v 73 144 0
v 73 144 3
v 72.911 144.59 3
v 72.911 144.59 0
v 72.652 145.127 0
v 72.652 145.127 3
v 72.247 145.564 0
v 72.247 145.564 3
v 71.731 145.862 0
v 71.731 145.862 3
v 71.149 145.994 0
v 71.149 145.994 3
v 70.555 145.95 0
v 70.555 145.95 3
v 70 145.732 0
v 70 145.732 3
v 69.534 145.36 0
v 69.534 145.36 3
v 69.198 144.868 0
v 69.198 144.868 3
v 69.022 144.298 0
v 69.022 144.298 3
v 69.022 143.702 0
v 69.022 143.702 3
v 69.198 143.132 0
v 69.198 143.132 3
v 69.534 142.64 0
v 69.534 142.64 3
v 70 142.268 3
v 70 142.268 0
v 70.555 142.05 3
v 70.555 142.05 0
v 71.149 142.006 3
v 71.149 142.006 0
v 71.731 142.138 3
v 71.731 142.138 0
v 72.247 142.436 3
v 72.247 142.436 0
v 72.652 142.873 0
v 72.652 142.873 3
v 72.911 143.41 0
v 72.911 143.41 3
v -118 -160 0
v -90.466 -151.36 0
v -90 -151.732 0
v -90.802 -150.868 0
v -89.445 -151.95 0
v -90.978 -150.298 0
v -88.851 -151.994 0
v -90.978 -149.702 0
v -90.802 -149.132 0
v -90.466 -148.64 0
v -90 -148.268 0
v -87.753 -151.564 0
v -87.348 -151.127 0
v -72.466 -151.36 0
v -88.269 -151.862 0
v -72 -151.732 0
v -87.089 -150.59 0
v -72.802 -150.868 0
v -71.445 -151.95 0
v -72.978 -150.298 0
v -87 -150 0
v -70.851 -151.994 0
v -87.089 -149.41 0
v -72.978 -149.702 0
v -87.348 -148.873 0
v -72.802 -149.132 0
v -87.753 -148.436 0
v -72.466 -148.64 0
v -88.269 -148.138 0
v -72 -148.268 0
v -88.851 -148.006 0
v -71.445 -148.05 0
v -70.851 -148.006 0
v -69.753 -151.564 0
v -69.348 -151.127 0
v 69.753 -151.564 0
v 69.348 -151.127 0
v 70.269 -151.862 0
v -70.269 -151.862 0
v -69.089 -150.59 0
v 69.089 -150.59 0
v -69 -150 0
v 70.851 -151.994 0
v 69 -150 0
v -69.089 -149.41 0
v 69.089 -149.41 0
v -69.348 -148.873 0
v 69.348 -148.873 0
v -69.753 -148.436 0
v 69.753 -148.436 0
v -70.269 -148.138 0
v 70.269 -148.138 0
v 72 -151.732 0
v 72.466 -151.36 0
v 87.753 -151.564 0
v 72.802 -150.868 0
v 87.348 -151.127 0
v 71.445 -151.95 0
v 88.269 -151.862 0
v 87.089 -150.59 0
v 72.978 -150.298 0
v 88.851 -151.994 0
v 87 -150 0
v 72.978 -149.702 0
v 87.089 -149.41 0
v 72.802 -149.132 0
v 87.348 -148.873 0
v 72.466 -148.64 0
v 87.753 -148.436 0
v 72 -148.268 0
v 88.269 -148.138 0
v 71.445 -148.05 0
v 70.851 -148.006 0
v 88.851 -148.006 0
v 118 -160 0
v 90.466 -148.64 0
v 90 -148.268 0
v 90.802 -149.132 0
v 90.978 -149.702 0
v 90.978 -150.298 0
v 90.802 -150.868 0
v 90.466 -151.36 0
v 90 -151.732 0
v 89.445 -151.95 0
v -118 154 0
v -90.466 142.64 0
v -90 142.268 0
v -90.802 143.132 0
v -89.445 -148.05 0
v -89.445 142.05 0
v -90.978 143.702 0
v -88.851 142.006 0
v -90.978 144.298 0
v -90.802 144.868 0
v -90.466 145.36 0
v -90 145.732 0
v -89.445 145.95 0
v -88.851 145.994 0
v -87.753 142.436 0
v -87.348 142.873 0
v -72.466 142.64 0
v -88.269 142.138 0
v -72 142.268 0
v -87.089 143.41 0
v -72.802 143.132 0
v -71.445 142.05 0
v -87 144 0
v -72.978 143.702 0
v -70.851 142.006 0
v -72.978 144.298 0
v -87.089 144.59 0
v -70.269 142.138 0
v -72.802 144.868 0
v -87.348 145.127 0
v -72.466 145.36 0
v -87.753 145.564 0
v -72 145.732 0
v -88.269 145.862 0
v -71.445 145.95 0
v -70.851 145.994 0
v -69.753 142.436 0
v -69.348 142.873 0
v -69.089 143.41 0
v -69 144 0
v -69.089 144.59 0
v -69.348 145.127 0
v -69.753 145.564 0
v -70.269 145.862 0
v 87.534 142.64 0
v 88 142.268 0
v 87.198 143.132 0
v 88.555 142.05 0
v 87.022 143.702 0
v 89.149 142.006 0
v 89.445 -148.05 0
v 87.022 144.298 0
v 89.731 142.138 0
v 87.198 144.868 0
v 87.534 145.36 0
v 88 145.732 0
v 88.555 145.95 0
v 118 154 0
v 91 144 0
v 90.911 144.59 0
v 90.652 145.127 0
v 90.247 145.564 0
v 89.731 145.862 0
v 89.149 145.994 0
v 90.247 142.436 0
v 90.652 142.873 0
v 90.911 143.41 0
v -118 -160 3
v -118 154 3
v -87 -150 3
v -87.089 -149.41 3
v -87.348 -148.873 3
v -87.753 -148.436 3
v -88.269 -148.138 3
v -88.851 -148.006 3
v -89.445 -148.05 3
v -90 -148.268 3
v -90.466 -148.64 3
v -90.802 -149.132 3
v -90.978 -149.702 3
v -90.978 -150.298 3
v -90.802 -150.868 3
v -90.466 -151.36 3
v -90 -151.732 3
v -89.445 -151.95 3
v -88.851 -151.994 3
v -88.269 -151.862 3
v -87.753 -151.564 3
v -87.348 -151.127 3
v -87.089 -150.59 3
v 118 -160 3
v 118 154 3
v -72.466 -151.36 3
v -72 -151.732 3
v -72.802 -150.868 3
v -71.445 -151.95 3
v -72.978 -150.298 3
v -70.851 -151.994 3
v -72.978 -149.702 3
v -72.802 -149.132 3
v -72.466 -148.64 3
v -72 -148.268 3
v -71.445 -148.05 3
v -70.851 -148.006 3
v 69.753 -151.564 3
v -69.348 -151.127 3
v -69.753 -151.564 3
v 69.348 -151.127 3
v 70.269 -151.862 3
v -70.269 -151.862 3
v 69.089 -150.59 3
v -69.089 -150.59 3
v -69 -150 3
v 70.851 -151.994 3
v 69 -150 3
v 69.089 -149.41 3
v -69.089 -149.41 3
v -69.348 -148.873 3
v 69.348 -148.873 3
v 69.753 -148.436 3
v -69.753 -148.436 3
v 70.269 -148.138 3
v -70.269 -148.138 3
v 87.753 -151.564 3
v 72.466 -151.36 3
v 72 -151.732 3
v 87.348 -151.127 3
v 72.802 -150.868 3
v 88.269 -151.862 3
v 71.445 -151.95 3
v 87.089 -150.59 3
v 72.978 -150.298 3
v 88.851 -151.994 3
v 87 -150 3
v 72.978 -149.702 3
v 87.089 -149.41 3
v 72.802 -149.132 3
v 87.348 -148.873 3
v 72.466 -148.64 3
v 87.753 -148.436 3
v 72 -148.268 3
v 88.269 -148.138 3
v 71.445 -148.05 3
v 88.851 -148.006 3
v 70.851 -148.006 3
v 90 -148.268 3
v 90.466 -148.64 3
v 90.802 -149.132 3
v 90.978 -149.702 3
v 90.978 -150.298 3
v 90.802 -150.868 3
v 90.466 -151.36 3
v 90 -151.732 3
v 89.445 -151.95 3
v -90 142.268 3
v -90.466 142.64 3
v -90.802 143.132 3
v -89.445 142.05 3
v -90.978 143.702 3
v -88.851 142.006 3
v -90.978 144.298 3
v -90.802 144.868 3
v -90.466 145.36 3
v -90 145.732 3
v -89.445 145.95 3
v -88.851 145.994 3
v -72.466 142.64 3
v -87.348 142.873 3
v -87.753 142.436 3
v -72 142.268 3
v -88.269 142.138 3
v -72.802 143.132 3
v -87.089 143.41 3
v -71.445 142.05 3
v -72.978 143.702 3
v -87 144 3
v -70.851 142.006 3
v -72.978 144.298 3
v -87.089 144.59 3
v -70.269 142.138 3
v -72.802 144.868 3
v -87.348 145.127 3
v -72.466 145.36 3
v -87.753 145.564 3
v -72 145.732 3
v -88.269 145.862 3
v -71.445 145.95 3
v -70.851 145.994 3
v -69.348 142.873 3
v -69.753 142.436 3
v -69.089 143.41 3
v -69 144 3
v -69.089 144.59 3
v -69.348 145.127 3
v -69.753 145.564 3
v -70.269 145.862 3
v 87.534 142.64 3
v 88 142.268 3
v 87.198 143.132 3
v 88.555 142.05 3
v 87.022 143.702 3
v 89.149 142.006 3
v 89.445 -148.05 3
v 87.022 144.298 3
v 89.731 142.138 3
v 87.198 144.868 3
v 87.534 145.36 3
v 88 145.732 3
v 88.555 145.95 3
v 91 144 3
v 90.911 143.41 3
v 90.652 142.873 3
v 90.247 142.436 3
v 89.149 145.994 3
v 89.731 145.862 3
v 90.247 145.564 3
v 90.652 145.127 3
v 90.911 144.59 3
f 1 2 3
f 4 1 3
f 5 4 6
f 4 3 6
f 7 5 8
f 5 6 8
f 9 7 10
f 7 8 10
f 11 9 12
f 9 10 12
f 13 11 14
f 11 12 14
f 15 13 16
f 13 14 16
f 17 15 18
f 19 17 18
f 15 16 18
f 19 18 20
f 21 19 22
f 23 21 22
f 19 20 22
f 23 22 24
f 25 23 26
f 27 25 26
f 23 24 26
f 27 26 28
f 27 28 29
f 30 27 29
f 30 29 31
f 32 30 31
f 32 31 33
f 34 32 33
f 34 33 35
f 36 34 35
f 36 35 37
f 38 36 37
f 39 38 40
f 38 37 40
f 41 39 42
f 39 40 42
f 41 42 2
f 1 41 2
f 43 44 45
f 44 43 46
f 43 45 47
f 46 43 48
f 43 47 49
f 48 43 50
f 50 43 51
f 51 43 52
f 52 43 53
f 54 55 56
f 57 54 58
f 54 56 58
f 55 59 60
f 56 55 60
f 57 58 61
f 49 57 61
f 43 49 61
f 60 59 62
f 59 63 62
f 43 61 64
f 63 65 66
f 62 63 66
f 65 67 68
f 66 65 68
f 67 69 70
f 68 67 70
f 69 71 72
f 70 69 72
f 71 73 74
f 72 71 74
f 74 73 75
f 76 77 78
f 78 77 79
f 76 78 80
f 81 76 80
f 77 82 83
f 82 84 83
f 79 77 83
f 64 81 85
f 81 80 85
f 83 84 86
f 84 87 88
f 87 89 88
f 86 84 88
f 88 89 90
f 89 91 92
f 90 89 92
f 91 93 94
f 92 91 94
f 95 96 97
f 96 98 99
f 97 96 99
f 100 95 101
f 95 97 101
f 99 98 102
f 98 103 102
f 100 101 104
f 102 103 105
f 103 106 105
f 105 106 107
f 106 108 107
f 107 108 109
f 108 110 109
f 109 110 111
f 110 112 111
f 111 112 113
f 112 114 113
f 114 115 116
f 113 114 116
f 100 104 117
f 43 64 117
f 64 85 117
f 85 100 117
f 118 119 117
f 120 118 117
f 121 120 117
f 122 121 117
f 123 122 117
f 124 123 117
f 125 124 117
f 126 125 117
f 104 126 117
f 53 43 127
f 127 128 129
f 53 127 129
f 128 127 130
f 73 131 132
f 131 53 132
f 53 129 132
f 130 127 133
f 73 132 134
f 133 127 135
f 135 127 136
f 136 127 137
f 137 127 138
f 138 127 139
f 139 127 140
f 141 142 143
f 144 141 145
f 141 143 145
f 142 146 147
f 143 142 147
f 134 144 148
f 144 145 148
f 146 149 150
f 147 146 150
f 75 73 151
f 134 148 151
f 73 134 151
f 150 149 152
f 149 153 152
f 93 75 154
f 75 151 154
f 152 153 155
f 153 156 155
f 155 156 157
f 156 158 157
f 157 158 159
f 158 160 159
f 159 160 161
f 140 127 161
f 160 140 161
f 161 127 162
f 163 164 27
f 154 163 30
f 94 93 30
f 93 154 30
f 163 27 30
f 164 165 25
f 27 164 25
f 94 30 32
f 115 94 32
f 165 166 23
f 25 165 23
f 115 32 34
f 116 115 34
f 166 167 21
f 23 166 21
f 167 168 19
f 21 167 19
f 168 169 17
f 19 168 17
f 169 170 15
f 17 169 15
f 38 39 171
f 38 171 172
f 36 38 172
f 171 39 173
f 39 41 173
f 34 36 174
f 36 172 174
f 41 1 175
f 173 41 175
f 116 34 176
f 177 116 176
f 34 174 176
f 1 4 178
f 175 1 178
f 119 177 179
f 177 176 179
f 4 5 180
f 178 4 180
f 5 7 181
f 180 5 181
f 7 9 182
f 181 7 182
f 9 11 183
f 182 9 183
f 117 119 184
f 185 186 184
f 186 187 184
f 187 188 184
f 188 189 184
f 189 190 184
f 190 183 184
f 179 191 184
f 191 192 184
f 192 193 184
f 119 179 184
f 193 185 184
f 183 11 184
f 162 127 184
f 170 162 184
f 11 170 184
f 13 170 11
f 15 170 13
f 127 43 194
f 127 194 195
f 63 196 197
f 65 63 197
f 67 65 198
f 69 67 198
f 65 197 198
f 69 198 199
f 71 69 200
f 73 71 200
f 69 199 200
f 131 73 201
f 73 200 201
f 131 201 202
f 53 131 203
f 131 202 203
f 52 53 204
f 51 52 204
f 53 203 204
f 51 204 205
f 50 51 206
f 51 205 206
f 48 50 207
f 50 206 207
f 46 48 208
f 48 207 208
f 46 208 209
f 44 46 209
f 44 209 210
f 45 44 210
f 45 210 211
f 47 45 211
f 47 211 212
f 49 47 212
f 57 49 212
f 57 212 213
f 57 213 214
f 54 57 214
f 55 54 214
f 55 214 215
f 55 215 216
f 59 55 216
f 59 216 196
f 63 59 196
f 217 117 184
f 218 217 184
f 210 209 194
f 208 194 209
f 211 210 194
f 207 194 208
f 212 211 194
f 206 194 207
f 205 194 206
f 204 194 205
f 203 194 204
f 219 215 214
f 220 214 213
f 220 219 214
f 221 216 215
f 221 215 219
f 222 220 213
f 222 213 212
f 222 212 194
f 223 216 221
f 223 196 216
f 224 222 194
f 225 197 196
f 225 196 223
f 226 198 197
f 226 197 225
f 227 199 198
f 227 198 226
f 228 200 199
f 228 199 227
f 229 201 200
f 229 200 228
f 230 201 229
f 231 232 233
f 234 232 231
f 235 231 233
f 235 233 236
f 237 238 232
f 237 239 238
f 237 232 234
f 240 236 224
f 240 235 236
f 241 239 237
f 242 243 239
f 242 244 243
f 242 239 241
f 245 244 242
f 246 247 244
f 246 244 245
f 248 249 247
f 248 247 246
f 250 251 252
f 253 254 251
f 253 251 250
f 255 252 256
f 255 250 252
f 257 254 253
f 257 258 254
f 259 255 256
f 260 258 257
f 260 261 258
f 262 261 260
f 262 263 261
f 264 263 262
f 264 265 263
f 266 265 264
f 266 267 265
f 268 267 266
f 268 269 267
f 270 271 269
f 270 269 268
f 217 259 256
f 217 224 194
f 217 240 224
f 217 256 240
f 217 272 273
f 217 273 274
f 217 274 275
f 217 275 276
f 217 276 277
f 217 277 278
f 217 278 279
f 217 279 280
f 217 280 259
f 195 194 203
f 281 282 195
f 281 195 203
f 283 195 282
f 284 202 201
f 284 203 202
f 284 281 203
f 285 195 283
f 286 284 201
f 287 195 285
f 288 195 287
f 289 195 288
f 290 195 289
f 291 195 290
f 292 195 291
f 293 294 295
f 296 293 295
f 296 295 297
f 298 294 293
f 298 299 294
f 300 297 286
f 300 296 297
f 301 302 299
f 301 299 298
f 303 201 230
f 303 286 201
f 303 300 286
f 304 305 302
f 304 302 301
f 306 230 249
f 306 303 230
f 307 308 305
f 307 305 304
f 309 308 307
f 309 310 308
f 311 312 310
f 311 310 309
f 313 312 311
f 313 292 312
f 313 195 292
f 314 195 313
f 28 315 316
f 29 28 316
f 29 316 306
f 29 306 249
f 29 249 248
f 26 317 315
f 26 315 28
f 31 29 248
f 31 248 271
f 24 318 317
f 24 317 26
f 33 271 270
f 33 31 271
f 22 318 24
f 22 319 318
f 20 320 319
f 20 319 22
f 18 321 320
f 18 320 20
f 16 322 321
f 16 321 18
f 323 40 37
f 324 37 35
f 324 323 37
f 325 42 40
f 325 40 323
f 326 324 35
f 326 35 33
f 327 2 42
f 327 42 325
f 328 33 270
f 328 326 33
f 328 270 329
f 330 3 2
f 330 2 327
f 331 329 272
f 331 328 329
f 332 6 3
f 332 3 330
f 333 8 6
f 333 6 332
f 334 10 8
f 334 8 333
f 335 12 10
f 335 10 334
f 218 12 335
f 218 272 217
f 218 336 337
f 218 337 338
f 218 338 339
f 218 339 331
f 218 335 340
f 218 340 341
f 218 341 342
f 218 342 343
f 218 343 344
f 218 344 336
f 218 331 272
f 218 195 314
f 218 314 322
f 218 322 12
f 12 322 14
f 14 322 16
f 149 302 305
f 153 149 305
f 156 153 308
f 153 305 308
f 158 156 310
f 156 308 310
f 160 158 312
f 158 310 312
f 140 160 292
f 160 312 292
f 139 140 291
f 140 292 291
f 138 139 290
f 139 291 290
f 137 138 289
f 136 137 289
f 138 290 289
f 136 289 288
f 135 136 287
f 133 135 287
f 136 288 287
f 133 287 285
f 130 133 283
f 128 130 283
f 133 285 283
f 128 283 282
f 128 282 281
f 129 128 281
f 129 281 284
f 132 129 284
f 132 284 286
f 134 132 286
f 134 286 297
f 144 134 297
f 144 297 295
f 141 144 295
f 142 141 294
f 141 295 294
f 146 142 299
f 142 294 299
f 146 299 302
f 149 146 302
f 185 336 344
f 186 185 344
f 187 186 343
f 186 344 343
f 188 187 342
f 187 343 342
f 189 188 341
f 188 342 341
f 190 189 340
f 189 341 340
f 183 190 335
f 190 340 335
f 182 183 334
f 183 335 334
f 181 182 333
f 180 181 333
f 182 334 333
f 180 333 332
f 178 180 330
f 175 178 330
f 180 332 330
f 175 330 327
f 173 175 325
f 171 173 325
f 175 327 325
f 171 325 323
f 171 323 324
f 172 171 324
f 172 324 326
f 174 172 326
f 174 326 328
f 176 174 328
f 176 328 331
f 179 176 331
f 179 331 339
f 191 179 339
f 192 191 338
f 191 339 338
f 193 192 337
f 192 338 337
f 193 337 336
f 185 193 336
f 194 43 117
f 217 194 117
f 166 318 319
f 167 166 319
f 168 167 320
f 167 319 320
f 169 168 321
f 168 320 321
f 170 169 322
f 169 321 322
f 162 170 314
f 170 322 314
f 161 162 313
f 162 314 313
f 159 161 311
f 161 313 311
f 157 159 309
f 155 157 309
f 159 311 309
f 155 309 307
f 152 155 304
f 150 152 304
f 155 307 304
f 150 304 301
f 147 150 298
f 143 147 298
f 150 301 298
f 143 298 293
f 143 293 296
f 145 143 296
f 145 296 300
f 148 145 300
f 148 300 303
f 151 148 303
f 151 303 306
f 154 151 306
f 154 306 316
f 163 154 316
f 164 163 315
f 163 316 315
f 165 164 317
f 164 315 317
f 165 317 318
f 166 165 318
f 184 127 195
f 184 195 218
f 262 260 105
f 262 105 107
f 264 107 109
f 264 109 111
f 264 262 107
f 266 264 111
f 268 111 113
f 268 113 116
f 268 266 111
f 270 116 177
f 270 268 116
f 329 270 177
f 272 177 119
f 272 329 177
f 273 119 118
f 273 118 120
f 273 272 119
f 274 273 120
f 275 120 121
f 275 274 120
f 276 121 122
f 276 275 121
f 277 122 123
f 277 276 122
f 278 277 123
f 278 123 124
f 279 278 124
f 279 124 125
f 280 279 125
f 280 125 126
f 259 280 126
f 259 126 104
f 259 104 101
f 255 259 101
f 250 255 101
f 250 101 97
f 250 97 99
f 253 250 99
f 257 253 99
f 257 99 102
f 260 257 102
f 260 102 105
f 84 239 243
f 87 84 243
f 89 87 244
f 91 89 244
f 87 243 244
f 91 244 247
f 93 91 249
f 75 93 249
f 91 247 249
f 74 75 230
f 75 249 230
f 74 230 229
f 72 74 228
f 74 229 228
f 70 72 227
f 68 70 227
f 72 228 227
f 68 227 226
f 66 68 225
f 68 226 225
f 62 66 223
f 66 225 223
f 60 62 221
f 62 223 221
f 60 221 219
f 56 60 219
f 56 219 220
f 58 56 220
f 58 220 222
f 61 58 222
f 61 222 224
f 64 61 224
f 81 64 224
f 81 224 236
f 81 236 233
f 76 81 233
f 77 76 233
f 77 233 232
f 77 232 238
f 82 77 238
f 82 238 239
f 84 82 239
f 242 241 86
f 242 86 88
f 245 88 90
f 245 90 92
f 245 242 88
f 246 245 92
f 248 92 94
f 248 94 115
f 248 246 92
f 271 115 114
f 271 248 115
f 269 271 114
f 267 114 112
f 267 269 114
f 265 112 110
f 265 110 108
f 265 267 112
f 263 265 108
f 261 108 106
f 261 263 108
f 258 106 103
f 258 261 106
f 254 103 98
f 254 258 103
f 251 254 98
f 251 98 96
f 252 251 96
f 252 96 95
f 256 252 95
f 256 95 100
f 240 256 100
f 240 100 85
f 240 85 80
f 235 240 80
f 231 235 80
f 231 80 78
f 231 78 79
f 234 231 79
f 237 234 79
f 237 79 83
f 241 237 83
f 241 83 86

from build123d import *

# Parameters (mm, degrees)
ESQUISSE1_W             = 236
ESQUISSE1_H             = 314
BOSS_EXTRU_1_DEPTH      = 3
ENL_V_MAT_EXTRU_1_REACH = 200.829
ESQUISSE3_R             = 2


with BuildPart() as part:
    # Esquisse1 → Boss.-Extru.1 (new body)
    with BuildSketch(Plane.XY):
        with Locations((0, -3)):
            Rectangle(ESQUISSE1_W, ESQUISSE1_H)
    extrude(amount=BOSS_EXTRU_1_DEPTH)

    # Esquisse3 → Enlèv. mat.-Extru.1 (cut, up to next)
    with BuildSketch(Plane.XY.offset(3), mode=Mode.PRIVATE) as enl_v_mat_extru_1_sk1:
        with Locations((-71, -150)):
            Circle(ESQUISSE3_R)
    enl_v_mat_extru_1_tool1 = extrude(enl_v_mat_extru_1_sk1.sketch, amount=-ENL_V_MAT_EXTRU_1_REACH, mode=Mode.PRIVATE) & part.part
    # Esquisse3 → Enlèv. mat.-Extru.1 (cut, up to next)
    with BuildSketch(Plane.XY.offset(3), mode=Mode.PRIVATE) as enl_v_mat_extru_1_sk2:
        with Locations((-89, -150)):
            Circle(ESQUISSE3_R)
    enl_v_mat_extru_1_tool2 = extrude(enl_v_mat_extru_1_sk2.sketch, amount=-ENL_V_MAT_EXTRU_1_REACH, mode=Mode.PRIVATE) & part.part
    # Esquisse3 → Enlèv. mat.-Extru.1 (cut, up to next)
    with BuildSketch(Plane.XY.offset(3), mode=Mode.PRIVATE) as enl_v_mat_extru_1_sk3:
        with Locations((-89, 144)):
            Circle(ESQUISSE3_R)
    enl_v_mat_extru_1_tool3 = extrude(enl_v_mat_extru_1_sk3.sketch, amount=-ENL_V_MAT_EXTRU_1_REACH, mode=Mode.PRIVATE) & part.part
    # Esquisse3 → Enlèv. mat.-Extru.1 (cut, up to next)
    with BuildSketch(Plane.XY.offset(3), mode=Mode.PRIVATE) as enl_v_mat_extru_1_sk4:
        with Locations((-71, 144)):
            Circle(ESQUISSE3_R)
    enl_v_mat_extru_1_tool4 = extrude(enl_v_mat_extru_1_sk4.sketch, amount=-ENL_V_MAT_EXTRU_1_REACH, mode=Mode.PRIVATE) & part.part
    # Esquisse3 → Enlèv. mat.-Extru.1 (cut, up to next)
    with BuildSketch(Plane.XY.offset(3), mode=Mode.PRIVATE) as enl_v_mat_extru_1_sk5:
        with Locations((71, 144)):
            Circle(ESQUISSE3_R)
    enl_v_mat_extru_1_tool5 = extrude(enl_v_mat_extru_1_sk5.sketch, amount=-ENL_V_MAT_EXTRU_1_REACH, mode=Mode.PRIVATE) & part.part
    # Esquisse3 → Enlèv. mat.-Extru.1 (cut, up to next)
    with BuildSketch(Plane.XY.offset(3), mode=Mode.PRIVATE) as enl_v_mat_extru_1_sk6:
        with Locations((89, 144)):
            Circle(ESQUISSE3_R)
    enl_v_mat_extru_1_tool6 = extrude(enl_v_mat_extru_1_sk6.sketch, amount=-ENL_V_MAT_EXTRU_1_REACH, mode=Mode.PRIVATE) & part.part
    enl_v_mat_extru_1_1 = enl_v_mat_extru_1_tool1.solids().sort_by_distance((-71, -150, 3))[0]
    add(enl_v_mat_extru_1_1, mode=Mode.SUBTRACT)
    enl_v_mat_extru_1_2 = enl_v_mat_extru_1_tool2.solids().sort_by_distance((-89, -150, 3))[0]
    add(enl_v_mat_extru_1_2, mode=Mode.SUBTRACT)
    enl_v_mat_extru_1_3 = enl_v_mat_extru_1_tool3.solids().sort_by_distance((-89, 144, 3))[0]
    add(enl_v_mat_extru_1_3, mode=Mode.SUBTRACT)
    enl_v_mat_extru_1_4 = enl_v_mat_extru_1_tool4.solids().sort_by_distance((-71, 144, 3))[0]
    add(enl_v_mat_extru_1_4, mode=Mode.SUBTRACT)
    enl_v_mat_extru_1_5 = enl_v_mat_extru_1_tool5.solids().sort_by_distance((71, 144, 3))[0]
    add(enl_v_mat_extru_1_5, mode=Mode.SUBTRACT)
    enl_v_mat_extru_1_6 = enl_v_mat_extru_1_tool6.solids().sort_by_distance((89, 144, 3))[0]
    add(enl_v_mat_extru_1_6, mode=Mode.SUBTRACT)
    enl_v_mat_extru_1 = enl_v_mat_extru_1_1 + enl_v_mat_extru_1_2 + enl_v_mat_extru_1_3 + enl_v_mat_extru_1_4 + enl_v_mat_extru_1_5 + enl_v_mat_extru_1_6  # Enlèv. mat.-Extru.1 as one shape, for the pattern or mirror that repeats it

    # Symétrie1: Enlèv. mat.-Extru.1 across plane
    add(enl_v_mat_extru_1.mirror(Plane(origin=(0, 0, 0), x_dir=(0, 0, 1), z_dir=(1, 0, 0))), mode=Mode.SUBTRACT)


solid = part.part
